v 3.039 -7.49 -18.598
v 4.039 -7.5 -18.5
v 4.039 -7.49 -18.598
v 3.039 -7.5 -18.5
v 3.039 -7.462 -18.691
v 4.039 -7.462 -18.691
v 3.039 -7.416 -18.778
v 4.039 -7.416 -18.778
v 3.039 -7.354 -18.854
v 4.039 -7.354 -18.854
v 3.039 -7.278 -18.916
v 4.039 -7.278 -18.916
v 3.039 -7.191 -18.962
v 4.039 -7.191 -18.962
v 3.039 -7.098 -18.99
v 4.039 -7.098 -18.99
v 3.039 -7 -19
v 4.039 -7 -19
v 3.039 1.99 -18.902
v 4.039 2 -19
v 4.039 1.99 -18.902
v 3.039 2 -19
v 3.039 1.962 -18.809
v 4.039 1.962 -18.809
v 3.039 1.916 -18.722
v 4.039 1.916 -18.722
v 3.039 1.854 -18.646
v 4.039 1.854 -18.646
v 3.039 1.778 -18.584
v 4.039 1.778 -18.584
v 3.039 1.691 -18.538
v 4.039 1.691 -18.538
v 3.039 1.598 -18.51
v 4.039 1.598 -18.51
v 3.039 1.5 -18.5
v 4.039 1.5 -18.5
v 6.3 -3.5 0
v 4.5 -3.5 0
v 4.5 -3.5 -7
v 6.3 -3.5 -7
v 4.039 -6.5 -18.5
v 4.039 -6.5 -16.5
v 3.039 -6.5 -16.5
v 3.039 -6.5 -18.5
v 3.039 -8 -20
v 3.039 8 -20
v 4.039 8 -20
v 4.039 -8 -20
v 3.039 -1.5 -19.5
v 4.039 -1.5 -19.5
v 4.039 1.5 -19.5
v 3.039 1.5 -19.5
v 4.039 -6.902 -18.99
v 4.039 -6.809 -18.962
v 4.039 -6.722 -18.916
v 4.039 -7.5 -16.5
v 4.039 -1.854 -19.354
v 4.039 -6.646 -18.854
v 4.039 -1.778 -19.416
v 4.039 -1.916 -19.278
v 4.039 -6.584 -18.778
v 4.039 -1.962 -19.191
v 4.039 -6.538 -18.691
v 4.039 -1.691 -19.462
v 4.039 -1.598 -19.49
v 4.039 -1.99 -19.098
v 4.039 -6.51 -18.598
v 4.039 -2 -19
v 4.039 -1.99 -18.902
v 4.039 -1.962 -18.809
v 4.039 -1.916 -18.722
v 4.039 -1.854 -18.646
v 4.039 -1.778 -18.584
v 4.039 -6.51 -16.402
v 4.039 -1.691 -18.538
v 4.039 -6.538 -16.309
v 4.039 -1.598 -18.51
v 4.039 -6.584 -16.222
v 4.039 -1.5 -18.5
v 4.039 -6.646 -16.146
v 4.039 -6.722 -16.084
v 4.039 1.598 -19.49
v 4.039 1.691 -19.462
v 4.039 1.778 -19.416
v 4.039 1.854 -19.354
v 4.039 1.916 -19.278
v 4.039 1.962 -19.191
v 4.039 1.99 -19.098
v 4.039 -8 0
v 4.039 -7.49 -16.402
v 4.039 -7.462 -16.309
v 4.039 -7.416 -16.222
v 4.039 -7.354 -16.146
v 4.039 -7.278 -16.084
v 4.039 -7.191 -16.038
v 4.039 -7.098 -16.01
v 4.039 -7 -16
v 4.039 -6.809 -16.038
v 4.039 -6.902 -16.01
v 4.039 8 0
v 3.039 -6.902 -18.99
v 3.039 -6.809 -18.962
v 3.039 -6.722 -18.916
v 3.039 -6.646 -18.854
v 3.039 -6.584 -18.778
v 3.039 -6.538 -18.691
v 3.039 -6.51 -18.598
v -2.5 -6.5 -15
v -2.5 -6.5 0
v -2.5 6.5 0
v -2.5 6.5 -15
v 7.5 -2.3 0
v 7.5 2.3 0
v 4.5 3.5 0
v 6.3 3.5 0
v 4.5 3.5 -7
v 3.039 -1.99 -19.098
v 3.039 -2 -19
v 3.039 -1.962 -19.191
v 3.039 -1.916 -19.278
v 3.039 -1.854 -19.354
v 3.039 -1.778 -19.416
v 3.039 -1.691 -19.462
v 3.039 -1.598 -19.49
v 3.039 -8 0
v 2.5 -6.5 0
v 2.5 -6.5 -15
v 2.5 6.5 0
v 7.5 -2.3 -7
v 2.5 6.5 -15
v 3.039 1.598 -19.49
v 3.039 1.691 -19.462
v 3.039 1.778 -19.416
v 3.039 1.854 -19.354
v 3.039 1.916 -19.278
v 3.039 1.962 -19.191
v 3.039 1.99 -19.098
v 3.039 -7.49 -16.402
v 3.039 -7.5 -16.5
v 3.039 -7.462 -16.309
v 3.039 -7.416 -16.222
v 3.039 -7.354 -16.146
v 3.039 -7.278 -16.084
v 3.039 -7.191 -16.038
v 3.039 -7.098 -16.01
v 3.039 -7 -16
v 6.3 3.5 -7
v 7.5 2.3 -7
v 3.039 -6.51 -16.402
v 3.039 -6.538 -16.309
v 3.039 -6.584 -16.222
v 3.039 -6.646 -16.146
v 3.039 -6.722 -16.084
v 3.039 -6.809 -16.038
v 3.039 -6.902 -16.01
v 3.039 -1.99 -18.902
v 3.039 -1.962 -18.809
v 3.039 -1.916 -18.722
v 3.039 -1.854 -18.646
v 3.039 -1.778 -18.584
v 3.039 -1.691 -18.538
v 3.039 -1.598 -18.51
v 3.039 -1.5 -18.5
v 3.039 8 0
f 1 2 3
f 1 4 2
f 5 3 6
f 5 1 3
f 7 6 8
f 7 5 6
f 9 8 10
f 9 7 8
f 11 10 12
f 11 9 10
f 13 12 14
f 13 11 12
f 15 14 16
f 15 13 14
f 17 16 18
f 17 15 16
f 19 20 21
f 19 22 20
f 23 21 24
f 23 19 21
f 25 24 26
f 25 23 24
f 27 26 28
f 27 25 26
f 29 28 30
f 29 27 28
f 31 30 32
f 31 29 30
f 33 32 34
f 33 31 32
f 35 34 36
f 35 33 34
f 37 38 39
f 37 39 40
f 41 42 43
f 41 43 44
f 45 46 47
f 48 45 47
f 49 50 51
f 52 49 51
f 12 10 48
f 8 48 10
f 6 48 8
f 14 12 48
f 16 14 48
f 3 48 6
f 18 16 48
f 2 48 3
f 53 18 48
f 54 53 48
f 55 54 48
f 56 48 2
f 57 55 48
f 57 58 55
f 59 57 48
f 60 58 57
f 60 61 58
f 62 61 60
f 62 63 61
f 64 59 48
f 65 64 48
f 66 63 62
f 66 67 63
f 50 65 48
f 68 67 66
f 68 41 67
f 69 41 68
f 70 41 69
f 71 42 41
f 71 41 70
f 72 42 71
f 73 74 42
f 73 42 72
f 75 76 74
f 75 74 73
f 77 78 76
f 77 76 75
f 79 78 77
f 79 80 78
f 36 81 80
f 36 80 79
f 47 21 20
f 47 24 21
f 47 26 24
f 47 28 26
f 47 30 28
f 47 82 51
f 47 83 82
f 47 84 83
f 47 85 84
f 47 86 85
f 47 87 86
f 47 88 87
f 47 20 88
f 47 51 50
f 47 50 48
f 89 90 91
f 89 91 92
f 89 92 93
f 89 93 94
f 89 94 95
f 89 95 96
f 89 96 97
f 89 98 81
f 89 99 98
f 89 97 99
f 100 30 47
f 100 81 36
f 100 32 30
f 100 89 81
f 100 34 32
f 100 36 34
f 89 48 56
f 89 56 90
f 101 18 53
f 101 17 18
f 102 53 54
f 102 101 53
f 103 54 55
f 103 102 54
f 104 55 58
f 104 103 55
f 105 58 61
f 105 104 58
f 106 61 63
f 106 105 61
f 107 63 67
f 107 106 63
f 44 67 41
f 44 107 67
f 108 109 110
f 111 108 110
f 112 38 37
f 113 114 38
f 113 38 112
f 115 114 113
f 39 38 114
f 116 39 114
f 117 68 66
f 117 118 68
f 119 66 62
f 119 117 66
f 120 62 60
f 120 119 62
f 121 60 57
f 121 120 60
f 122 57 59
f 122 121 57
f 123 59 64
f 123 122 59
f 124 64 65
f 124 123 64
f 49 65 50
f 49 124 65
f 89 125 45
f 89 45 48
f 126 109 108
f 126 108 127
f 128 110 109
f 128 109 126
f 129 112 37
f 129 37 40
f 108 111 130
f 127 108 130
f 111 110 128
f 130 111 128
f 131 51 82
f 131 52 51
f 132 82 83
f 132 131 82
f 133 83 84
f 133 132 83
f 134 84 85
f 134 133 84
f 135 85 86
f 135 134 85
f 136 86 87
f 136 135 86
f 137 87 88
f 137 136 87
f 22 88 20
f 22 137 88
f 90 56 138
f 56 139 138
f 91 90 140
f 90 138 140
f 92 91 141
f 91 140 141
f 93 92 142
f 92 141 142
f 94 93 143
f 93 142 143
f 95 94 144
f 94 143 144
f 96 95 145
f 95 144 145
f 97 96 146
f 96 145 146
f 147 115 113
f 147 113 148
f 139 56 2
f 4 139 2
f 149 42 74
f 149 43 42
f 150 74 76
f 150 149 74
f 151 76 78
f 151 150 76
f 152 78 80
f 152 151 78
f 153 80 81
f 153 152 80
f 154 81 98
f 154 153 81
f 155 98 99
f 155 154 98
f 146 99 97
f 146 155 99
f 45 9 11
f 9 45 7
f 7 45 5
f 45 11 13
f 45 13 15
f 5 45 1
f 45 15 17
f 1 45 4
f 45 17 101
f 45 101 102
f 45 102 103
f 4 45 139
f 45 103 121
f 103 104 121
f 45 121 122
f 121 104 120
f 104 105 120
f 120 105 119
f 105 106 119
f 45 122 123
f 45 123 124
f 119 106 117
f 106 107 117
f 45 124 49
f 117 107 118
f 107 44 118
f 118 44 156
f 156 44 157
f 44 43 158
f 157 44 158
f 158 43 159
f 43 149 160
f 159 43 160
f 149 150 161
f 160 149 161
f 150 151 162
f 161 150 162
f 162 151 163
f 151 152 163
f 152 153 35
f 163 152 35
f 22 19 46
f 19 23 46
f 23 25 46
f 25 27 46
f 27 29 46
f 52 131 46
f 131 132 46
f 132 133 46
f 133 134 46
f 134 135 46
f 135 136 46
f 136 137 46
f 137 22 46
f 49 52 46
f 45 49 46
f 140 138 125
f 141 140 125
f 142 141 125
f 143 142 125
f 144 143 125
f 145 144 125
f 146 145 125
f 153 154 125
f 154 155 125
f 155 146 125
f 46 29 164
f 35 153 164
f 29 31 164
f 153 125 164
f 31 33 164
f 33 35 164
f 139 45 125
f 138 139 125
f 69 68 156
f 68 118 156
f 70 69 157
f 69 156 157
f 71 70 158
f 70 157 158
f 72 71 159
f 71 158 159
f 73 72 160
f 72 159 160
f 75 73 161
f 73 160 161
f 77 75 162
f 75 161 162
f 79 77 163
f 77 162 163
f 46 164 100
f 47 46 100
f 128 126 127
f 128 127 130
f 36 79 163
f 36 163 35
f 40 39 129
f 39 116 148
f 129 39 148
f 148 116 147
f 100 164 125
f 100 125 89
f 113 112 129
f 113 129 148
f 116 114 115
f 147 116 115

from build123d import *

# Parameters (mm, degrees)
SKETCH_1_W          = 1
SKETCH_1_H          = 16
EXTRUDE_1_DEPTH     = 20
SKETCH_1_3_W        = 5
SKETCH_1_3_H        = 13
EXTRUDE_2_DEPTH     = 15
SKETCH_1_4_W        = 3
SKETCH_1_4_H        = 7
EXTRUDE_3_DEPTH     = 7
SKETCH_2_W          = 1
SKETCH_2_H          = 4
SKETCH_2_W_2        = 3
SKETCH_2_H_2        = 1
CUT_EXTRUDE_1_DEPTH = 23.511320343
FILLET_1_R          = 0.5
CHAMFER_1_SIZE      = 1.2


with BuildPart() as part:
    # Эскиз1 → Бобышка-Вытянуть1 (new body)
    with BuildSketch(Plane.XY):
        with Locations((3.539078192, 0)):
            Rectangle(SKETCH_1_W, SKETCH_1_H)
    extrude(amount=-EXTRUDE_1_DEPTH)

    # Эскиз2 → Вырез-Вытянуть1 (cut, through all)
    with BuildSketch(Plane(origin=(4.039078192, 0, 0), x_dir=(0, 0, -1), z_dir=(1, 0, 0))):
        with Locations((19, 0)):
            Rectangle(SKETCH_2_W, SKETCH_2_H)
        with Locations((17.5, -7)):
            Rectangle(SKETCH_2_W_2, SKETCH_2_H_2)
    extrude(amount=-CUT_EXTRUDE_1_DEPTH, mode=Mode.SUBTRACT)

    # Скругление1
    fillet_1_edges = [part.edges().sort_by_distance(p)[0] for p in [
        (3.539078192, -2, -18.5),
        (3.539078192, 2, -18.5),
        (3.539078192, 2, -19.5),
        (3.539078192, -2, -19.5),
        (3.539078192, -7.5, -19),
        (3.539078192, -6.5, -19),
        (3.539078192, -6.5, -16),
        (3.539078192, -7.5, -16),
    ]]
    fillet(fillet_1_edges, radius=FILLET_1_R - 0.0001)  # a hair under: the kernel refuses the full size


with BuildPart() as body_2:
    # Эскиз1<3> → Бобышка-Вытянуть2 (new body)
    with BuildSketch(Plane.XY):
        Rectangle(SKETCH_1_3_W, SKETCH_1_3_H)
    extrude(amount=-EXTRUDE_2_DEPTH)


with BuildPart() as body_3:
    # Эскиз1<4> → Бобышка-Вытянуть3 (new body)
    with BuildSketch(Plane.XY):
        with Locations((6, 0)):
            Rectangle(SKETCH_1_4_W, SKETCH_1_4_H)
    extrude(amount=-EXTRUDE_3_DEPTH)

    # Фаска1
    chamfer_1_edges = [body_3.edges().sort_by_distance(p)[0] for p in [
        (7.5, -3.5, -3.5),
        (7.5, 3.5, -3.5),
    ]]
    chamfer(chamfer_1_edges, length=CHAMFER_1_SIZE)


solid = Compound([part.part, body_2.part, body_3.part])
